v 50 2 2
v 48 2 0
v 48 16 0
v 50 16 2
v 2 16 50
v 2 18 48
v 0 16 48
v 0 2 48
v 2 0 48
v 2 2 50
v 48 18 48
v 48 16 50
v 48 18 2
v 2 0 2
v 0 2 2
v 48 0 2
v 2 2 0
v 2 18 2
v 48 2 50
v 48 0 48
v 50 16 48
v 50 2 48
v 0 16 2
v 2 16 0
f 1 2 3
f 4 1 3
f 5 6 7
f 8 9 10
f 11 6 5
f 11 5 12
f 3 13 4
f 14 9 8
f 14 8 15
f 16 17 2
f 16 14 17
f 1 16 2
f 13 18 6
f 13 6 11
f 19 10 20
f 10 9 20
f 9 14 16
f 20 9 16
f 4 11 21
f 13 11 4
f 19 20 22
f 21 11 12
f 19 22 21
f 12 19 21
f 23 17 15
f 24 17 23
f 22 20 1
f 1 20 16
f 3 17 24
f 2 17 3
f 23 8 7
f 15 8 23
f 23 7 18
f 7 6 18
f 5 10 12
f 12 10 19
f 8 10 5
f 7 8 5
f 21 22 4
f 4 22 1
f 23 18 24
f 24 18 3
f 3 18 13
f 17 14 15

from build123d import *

# Parameters (mm, degrees)
SKETCH1_W           = 50
SKETCH1_H           = 50
BOSS_EXTRUDE1_DEPTH = 18
CHAMFER1_SIZE       = 2


with BuildPart() as part:
    # Sketch1 → Boss-Extrude1 (new body)
    with BuildSketch(Plane(origin=(0, 0, 0), x_dir=(1, 0, 0), z_dir=(0, 1, 0))):
        with Locations((25, -25)):
            Rectangle(SKETCH1_W, SKETCH1_H)
    extrude(amount=BOSS_EXTRUDE1_DEPTH)

    # Chamfer1
    chamfer1_edges = [part.edges().sort_by_distance(p)[0] for p in [
        (50, 18, 25),
        (25, 18, 0),
        (0, 18, 25),
        (25, 0, 0),
        (50, 0, 25),
        (25, 0, 50),
        (0, 0, 25),
        (25, 18, 50),
        (0, 9, 0),
        (50, 9, 0),
        (50, 9, 50),
        (0, 9, 50),
    ]]
    chamfer(chamfer1_edges, length=CHAMFER1_SIZE)


solid = part.part
